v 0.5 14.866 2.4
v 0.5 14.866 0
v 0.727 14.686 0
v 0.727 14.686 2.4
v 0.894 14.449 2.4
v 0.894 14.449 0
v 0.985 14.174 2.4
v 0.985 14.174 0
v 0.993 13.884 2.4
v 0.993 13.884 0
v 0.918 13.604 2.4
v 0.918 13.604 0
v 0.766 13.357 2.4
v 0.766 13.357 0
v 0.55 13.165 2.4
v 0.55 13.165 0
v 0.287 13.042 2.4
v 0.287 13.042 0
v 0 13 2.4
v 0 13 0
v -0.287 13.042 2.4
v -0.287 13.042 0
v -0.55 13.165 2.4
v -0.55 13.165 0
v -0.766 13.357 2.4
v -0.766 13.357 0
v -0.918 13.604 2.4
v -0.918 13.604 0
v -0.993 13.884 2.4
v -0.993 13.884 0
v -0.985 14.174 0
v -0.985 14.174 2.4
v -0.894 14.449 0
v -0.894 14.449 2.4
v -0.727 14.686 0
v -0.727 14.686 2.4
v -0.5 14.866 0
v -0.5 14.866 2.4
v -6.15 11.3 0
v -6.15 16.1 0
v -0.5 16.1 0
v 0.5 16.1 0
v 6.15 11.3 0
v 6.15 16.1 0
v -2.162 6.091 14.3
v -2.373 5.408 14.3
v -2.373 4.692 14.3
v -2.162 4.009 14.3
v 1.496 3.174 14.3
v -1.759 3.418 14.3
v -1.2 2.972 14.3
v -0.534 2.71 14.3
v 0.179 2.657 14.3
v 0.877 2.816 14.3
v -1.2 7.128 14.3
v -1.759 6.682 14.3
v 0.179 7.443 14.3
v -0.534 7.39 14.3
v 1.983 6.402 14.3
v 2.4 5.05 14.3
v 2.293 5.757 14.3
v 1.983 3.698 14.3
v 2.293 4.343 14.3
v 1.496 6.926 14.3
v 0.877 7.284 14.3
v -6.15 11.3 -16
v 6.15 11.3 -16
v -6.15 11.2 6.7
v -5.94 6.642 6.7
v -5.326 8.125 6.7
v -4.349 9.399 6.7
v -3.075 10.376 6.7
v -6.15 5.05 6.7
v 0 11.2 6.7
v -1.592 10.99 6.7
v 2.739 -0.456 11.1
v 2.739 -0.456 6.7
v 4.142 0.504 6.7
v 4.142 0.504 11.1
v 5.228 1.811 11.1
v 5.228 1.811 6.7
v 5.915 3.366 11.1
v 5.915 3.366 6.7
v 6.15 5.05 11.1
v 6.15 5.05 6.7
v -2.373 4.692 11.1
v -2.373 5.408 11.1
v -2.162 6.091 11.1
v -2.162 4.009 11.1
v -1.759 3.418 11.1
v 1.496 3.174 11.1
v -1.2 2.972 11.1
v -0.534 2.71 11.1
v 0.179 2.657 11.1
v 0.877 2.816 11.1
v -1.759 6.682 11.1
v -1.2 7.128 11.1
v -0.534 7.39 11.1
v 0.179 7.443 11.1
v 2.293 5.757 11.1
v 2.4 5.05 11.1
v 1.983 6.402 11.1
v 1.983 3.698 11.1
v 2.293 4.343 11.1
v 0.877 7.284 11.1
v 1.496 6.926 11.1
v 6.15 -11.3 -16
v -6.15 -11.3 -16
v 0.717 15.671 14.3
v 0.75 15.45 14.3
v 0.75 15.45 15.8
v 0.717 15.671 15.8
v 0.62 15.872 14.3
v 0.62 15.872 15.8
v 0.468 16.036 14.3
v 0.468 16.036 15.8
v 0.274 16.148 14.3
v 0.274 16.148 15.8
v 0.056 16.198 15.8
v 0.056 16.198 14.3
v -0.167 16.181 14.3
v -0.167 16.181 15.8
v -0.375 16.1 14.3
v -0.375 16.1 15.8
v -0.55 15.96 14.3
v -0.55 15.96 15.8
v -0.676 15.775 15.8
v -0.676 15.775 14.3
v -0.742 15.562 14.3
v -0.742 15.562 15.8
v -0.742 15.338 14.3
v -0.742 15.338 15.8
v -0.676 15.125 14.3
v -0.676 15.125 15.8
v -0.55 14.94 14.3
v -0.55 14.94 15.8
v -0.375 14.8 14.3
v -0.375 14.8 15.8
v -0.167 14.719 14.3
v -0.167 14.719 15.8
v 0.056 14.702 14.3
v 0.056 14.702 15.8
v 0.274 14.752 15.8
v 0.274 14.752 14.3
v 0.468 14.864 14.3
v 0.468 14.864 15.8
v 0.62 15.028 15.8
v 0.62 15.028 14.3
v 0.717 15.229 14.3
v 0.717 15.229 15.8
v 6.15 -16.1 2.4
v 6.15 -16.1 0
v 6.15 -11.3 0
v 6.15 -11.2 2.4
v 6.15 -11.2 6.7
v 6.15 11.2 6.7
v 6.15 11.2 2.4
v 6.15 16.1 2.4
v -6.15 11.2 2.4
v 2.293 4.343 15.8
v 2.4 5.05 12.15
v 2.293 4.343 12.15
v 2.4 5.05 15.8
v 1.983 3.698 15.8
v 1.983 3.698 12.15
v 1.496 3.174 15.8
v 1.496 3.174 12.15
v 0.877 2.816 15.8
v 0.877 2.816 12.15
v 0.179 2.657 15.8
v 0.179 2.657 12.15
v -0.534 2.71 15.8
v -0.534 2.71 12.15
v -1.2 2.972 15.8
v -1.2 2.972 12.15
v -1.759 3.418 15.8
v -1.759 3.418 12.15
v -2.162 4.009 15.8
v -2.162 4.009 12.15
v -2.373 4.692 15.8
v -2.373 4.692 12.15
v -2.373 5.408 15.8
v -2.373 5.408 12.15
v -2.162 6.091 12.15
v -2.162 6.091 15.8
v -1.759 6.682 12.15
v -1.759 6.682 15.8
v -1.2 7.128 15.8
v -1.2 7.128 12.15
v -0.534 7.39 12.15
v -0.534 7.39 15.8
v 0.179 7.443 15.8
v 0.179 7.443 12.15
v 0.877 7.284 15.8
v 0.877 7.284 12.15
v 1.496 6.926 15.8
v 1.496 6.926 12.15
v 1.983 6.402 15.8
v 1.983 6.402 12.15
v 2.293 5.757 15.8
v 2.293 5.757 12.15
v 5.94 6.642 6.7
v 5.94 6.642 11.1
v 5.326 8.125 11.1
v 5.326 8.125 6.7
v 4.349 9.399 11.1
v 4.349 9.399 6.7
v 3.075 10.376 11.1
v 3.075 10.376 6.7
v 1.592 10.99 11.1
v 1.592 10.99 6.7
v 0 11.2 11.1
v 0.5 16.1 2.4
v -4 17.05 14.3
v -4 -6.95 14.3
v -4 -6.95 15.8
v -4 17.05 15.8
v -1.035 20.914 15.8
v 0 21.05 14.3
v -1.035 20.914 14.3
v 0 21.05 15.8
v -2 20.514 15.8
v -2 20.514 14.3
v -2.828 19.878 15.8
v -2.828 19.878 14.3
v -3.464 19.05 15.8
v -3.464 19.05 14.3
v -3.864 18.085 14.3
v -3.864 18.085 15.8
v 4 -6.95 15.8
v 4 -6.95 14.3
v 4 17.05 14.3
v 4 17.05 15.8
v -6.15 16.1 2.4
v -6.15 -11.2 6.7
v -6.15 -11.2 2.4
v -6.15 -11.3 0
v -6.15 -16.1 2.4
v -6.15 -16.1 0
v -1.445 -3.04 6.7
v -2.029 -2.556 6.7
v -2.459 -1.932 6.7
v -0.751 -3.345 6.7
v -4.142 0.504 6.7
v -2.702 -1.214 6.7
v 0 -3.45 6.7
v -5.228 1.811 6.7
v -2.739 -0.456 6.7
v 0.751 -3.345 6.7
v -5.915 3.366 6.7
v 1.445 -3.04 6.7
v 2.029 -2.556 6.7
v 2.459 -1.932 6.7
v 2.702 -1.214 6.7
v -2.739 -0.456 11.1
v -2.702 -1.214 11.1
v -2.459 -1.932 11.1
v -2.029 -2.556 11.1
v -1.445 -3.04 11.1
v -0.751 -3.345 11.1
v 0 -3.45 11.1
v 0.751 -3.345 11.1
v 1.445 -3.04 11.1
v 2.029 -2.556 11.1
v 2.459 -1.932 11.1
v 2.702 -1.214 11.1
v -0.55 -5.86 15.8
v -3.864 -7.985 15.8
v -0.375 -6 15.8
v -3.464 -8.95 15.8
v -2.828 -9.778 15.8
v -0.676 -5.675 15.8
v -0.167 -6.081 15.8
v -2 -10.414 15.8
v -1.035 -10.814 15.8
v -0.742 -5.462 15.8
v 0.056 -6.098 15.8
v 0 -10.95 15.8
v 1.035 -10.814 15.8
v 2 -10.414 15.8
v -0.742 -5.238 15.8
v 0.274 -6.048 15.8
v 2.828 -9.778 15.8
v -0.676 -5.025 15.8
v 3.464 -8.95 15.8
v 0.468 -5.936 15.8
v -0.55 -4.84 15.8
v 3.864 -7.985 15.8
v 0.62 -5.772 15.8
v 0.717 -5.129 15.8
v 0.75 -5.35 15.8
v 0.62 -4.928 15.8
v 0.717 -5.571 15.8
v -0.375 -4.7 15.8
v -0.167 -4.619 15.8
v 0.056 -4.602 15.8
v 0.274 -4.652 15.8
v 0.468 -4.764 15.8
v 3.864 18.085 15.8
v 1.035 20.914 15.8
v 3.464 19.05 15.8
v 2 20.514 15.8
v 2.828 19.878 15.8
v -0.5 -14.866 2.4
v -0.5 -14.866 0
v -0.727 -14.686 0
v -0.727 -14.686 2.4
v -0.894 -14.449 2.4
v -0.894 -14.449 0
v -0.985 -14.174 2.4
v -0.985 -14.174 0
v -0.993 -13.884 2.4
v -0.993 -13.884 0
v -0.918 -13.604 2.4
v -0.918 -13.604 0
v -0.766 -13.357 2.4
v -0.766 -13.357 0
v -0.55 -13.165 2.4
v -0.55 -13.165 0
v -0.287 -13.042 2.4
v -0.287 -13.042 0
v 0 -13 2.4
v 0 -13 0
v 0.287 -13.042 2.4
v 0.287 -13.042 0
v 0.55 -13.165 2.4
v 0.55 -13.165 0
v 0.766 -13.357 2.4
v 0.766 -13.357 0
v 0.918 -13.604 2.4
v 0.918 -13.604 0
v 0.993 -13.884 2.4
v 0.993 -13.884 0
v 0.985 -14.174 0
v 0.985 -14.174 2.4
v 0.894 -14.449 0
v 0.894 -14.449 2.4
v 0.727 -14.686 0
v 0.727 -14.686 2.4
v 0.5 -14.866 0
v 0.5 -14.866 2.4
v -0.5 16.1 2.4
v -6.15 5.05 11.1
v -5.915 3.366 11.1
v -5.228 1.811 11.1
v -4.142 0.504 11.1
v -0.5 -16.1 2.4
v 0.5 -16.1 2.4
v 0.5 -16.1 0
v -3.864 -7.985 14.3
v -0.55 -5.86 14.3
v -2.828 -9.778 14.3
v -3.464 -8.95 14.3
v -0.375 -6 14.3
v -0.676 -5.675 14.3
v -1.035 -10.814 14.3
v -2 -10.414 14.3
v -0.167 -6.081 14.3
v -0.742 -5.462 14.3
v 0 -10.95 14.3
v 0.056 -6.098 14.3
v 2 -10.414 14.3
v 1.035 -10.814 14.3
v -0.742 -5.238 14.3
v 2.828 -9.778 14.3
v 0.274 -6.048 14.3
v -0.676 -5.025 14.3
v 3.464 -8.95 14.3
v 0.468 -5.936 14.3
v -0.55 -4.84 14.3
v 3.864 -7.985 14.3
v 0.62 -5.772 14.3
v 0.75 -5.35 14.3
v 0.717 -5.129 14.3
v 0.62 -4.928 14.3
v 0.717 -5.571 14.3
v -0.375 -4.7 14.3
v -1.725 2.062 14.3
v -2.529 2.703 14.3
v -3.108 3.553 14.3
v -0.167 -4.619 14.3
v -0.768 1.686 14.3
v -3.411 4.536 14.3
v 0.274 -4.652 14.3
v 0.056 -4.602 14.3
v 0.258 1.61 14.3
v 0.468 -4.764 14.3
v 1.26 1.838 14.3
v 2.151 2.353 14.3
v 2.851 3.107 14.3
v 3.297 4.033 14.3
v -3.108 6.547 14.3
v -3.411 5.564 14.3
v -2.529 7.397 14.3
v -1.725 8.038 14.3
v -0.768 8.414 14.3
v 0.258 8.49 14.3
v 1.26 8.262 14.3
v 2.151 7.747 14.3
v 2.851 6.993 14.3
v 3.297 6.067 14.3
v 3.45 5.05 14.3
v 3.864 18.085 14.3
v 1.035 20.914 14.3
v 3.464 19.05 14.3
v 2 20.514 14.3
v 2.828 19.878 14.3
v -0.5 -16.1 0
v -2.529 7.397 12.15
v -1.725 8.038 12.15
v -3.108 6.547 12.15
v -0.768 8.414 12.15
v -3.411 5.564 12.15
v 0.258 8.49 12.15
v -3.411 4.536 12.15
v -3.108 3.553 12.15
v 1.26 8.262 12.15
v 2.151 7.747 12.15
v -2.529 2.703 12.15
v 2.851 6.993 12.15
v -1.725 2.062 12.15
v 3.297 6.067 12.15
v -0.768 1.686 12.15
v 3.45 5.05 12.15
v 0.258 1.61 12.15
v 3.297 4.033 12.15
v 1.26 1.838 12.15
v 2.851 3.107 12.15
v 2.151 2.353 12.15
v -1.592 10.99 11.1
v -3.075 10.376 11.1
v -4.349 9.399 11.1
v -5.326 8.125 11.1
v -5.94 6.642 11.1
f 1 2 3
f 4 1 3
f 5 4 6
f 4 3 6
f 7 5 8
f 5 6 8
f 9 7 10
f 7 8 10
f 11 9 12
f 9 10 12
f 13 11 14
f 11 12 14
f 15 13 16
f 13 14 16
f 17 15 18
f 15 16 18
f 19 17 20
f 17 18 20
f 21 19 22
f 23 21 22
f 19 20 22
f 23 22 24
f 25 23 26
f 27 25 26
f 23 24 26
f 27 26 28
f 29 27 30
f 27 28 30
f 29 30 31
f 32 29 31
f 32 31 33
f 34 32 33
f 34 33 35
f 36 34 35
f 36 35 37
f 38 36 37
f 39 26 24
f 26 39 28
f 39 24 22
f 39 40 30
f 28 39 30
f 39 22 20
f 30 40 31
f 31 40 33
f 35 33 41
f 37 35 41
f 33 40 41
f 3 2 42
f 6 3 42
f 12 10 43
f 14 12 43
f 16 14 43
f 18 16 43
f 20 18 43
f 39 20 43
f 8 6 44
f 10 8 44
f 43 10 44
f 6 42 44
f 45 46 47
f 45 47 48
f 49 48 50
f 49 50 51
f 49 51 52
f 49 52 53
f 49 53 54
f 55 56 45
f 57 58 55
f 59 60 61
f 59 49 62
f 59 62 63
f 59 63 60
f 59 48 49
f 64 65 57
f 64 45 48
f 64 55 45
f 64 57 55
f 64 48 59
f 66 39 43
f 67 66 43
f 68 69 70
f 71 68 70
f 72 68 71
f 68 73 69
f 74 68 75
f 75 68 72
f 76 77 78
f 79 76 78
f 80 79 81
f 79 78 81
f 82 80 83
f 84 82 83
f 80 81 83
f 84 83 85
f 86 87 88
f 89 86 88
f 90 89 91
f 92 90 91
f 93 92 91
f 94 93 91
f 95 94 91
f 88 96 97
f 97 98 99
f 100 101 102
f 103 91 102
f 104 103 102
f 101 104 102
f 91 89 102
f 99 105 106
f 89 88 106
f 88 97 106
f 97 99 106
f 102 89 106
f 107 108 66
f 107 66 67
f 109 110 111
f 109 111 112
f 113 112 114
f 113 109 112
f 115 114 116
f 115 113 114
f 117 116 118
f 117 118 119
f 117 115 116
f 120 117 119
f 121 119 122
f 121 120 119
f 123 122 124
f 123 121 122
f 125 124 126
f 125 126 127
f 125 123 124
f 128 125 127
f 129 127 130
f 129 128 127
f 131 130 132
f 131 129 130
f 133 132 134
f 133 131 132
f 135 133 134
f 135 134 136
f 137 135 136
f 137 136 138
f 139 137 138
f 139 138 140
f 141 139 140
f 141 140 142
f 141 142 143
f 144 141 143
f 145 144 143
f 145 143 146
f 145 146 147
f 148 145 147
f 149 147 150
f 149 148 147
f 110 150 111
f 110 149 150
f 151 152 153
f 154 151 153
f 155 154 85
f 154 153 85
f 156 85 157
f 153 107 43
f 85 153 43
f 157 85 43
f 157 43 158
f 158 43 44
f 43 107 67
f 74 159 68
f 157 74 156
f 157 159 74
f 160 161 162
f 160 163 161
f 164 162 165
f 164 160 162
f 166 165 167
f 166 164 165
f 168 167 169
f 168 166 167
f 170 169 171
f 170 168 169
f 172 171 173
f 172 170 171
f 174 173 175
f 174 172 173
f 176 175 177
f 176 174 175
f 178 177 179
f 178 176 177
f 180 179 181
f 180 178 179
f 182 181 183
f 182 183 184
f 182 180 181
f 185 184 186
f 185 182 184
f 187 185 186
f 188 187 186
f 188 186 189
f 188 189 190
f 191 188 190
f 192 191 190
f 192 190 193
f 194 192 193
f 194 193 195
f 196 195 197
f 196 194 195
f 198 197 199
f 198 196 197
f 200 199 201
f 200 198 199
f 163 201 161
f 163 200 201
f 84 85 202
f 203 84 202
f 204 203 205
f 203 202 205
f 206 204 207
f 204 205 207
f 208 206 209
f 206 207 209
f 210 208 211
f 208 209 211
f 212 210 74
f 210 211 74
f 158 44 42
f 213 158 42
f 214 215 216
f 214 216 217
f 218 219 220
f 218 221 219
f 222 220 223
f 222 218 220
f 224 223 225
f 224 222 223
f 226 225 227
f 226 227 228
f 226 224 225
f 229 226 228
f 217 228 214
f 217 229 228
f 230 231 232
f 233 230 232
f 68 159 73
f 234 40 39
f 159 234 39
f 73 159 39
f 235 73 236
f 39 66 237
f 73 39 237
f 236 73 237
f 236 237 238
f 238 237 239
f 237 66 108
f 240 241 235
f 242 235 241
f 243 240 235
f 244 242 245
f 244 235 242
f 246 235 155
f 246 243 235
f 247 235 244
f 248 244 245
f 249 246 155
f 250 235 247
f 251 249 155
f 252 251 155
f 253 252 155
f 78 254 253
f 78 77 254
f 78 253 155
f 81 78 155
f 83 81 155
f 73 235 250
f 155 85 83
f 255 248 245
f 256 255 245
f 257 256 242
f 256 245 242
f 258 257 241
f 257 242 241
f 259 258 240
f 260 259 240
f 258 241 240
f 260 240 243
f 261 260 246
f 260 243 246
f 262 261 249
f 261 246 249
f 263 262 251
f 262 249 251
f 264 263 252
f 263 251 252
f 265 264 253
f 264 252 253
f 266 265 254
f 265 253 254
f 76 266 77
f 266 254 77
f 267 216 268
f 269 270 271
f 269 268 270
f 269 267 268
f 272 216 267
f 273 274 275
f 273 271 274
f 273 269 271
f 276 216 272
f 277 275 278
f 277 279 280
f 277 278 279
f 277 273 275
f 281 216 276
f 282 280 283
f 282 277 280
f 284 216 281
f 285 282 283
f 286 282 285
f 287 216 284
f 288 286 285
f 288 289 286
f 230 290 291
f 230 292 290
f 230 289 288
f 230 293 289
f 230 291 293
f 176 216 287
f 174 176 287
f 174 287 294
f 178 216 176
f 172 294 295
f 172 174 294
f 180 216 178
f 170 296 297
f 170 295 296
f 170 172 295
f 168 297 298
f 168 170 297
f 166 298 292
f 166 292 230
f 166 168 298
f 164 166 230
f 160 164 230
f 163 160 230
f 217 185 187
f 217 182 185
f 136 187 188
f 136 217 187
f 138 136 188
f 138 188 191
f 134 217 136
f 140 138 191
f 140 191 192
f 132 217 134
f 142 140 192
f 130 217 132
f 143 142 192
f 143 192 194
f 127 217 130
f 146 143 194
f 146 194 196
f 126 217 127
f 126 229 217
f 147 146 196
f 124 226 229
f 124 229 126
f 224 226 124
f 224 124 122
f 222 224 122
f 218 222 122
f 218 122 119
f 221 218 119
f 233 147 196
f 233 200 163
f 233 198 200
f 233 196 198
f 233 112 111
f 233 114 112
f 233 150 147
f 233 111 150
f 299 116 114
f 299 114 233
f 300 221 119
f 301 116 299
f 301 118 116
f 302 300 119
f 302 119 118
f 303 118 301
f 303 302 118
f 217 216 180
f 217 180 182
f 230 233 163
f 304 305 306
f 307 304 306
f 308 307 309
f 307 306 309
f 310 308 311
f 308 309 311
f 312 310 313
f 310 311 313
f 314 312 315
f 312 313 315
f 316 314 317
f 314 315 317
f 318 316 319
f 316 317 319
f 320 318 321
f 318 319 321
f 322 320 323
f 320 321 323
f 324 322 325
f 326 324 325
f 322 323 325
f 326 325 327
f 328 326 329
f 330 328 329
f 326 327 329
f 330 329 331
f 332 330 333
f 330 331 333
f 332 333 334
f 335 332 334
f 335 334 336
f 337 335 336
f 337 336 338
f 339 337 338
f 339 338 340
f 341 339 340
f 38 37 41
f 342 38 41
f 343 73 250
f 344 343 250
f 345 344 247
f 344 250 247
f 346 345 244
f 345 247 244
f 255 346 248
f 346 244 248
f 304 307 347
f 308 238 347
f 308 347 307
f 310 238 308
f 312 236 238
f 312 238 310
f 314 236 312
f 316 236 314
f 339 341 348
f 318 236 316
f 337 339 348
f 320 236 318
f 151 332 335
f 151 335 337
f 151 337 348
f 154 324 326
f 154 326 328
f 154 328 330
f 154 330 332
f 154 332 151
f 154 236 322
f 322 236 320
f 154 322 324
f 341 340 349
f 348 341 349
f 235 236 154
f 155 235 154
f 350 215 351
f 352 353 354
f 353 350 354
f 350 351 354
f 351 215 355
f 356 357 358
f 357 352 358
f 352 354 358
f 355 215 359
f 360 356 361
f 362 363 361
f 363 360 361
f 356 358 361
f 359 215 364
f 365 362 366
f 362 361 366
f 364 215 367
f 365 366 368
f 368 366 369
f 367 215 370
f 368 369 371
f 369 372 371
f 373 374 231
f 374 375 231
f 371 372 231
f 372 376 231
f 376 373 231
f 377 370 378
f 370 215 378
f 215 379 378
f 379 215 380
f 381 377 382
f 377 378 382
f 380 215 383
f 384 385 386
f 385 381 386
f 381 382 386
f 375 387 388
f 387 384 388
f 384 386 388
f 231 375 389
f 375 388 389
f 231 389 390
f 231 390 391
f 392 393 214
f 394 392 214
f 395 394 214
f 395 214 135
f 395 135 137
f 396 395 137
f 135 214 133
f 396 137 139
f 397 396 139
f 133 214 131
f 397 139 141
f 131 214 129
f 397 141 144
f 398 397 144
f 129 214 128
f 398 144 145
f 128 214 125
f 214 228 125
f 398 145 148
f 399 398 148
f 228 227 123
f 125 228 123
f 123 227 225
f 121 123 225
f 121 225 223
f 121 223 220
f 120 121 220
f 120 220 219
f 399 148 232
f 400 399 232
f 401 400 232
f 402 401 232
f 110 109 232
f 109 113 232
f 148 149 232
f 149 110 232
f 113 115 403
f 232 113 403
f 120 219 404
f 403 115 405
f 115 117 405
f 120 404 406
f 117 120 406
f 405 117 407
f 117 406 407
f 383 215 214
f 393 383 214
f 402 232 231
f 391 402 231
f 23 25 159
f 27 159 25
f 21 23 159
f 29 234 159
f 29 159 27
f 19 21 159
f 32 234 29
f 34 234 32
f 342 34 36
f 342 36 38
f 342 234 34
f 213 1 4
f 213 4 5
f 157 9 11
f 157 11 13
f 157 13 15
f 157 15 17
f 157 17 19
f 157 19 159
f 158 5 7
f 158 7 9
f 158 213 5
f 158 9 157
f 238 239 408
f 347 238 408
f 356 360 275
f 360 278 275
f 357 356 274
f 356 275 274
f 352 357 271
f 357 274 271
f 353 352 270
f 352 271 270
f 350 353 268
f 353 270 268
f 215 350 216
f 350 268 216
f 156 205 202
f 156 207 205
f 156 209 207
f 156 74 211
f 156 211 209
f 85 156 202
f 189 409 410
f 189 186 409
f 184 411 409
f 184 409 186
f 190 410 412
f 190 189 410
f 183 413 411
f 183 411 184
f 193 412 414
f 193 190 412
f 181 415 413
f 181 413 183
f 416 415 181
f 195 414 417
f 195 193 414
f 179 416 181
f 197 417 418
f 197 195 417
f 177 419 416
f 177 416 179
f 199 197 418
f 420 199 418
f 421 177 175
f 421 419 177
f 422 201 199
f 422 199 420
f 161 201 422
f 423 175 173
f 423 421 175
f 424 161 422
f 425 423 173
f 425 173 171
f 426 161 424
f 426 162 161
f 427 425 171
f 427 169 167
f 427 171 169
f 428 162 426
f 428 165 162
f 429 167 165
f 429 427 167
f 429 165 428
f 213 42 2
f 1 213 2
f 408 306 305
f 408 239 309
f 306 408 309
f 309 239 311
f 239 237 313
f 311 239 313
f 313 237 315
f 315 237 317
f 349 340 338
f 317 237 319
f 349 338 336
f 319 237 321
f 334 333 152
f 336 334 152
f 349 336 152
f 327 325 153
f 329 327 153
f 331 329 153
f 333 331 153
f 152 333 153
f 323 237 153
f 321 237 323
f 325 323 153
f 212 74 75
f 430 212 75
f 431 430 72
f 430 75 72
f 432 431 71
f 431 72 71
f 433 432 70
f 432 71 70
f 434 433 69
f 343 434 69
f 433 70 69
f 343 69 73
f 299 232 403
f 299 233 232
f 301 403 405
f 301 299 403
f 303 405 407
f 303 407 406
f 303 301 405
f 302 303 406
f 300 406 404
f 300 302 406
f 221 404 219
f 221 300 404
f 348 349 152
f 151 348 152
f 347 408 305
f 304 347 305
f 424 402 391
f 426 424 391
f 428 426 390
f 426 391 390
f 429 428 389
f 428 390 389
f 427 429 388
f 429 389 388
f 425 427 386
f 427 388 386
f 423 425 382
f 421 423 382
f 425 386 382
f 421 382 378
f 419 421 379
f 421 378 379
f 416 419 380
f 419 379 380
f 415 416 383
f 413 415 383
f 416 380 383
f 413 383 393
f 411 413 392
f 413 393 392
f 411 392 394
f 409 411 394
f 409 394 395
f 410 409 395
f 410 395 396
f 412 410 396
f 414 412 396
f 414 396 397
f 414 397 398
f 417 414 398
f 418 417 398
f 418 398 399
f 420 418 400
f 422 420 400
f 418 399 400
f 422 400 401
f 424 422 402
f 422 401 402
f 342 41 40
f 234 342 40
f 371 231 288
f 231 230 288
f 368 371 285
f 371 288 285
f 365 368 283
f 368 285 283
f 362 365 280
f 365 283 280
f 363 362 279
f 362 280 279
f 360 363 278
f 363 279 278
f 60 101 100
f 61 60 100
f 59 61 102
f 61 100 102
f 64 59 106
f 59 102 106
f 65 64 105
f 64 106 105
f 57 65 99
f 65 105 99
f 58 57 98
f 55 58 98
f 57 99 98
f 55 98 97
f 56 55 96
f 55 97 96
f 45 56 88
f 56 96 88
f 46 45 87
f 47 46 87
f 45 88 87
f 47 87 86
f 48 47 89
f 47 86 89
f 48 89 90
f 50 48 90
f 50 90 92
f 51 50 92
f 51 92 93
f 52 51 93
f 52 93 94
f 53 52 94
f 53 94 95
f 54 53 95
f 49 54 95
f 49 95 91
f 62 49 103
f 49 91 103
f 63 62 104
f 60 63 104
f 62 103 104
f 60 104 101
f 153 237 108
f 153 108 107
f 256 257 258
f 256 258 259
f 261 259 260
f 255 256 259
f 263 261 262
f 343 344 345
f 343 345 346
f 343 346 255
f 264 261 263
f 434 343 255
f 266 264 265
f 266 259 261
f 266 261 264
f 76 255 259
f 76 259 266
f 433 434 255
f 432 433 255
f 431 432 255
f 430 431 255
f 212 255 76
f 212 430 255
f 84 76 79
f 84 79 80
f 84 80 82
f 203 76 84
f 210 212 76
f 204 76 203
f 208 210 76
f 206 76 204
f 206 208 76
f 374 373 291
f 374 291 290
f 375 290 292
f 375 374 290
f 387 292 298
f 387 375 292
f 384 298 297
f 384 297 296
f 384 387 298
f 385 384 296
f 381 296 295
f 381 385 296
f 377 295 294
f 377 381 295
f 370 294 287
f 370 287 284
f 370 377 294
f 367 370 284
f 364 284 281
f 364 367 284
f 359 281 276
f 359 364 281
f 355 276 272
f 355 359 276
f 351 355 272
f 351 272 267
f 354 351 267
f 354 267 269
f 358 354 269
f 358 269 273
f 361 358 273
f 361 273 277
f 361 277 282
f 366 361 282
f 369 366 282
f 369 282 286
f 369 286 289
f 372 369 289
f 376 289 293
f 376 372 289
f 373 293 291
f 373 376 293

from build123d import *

# Parameters (mm, degrees)
F1_DEPTH  = 2.4
F2_W      = 12.3
F2_H      = 22.4
F3_DEPTH  = 4.3
F5_DEPTH  = 4.4
F6_W      = 12.3
F6_H      = 22.6
F7_DEPTH  = 16
F8_R      = 2.4
F9_DEPTH  = 3.2
F10_W     = 8
F10_H     = 32
F10_R     = 0.75
F10_R_2   = 2.4
F11_DEPTH = 1.5
F12_R     = 3.45
F12_R_2   = 2.4
F13_DEPTH = 2.15
F14_R     = 3.99999


# Not quite as in the source:
# - a fillet or chamfer is up to 0.001 mm smaller than in the source, because OpenCascade refuses the exact size


with BuildPart() as f1:
    # F0 (on Top) → F1 (new body)
    with BuildSketch(Plane.XY):
        with BuildLine():
            Line((0.5, -16.1), (6.15, -16.1))
            Line((6.15, -16.1), (6.15, 16.1))
            Line((6.15, 16.1), (0.5, 16.1))
            Line((0.5, 16.1), (0.5, 14.8660254038))
            ThreePointArc((0.5, 14.8660254038), (0, 13), (-0.5, 14.8660254038))
            Line((-0.5, 14.8660254038), (-0.5, 16.1))
            Line((-0.5, 16.1), (-6.15, 16.1))
            Line((-6.15, 16.1), (-6.15, -16.1))
            Line((-6.15, -16.1), (-0.5, -16.1))
            Line((-0.5, -16.1), (-0.5, -14.8660254038))
            ThreePointArc((-0.5, -14.8660254038), (0, -13), (0.5, -14.8660254038))
            Line((0.5, -14.8660254038), (0.5, -16.1))
        make_face()
    extrude(amount=F1_DEPTH)

    # F2 (on face) → F3 (join)
    with BuildSketch(Plane.XY.offset(2.4)):
        Rectangle(F2_W, F2_H)
    extrude(amount=F3_DEPTH)

    # F4 (on face) → F5 (join)
    with BuildSketch(Plane.XY.offset(6.7)):
        with BuildLine():
            ThreePointArc((-6.15, 5.0500000209), (-5.2282149501, 1.8114403764), (-2.7391809778, -0.4563043478))
            ThreePointArc((-2.7391809778, -0.4563043478), (0, -3.45), (2.7391809778, -0.4563043478))
            ThreePointArc((2.7391809778, -0.4563043478), (5.2282149446, 1.8114403675), (6.15, 5.05))
            ThreePointArc((6.15, 5.05), (4.3487067043, 9.3987067043), (0, 11.2))
            ThreePointArc((0, 11.2), (-4.3487066969, 9.3987067117), (-6.15, 5.0500000209))
        make_face()
    extrude(amount=F5_DEPTH)

    # F6 (on face) → F7 (join)
    with BuildSketch(Plane(origin=(0, 0, 0), x_dir=(1, 0, 0), z_dir=(0, 0, -1))):
        Rectangle(F6_W, F6_H)
    extrude(amount=F7_DEPTH)


with BuildPart() as f9:
    # F8 (on face) → F9 (new body)
    with BuildSketch(Plane.XY.offset(11.1)):
        with Locations((0, 5.05)):
            Circle(F8_R)
    extrude(amount=F9_DEPTH)


with BuildPart() as f11:
    # F10 (on face) → F11 (new body)
    with BuildSketch(Plane.XY.offset(14.3)):
        with Locations((0, 5.05)):
            Rectangle(F10_W, F10_H)
        with Locations((0, -5.35)):
            Circle(F10_R, mode=Mode.SUBTRACT)
        with Locations((0, 5.05)):
            Circle(F10_R_2, mode=Mode.SUBTRACT)
        with Locations((0, 15.45)):
            Circle(F10_R, mode=Mode.SUBTRACT)
    extrude(amount=F11_DEPTH)

    # F12 (on face) → F13 (join)
    with BuildSketch(Plane(origin=(0, 0, 14.3), x_dir=(1, 0, 0), z_dir=(0, 0, -1))):
        with Locations((0, -5.05)):
            Circle(F12_R)
        with Locations((0, -5.05)):
            Circle(F12_R_2, mode=Mode.SUBTRACT)
    extrude(amount=F13_DEPTH)

    # F14 (radius 4 in the source; OpenCascade refuses exactly that, so slightly less here)
    f14_edges = [f11.edges().sort_by_distance(p)[0] for p in [
        (4, 21.05, 15.05),
        (-4, 21.05, 15.05),
        (4, -10.95, 15.05),
        (-4, -10.95, 15.05),
    ]]
    fillet(f14_edges, radius=F14_R)


solid = Compound([f1.part, f9.part, f11.part])
